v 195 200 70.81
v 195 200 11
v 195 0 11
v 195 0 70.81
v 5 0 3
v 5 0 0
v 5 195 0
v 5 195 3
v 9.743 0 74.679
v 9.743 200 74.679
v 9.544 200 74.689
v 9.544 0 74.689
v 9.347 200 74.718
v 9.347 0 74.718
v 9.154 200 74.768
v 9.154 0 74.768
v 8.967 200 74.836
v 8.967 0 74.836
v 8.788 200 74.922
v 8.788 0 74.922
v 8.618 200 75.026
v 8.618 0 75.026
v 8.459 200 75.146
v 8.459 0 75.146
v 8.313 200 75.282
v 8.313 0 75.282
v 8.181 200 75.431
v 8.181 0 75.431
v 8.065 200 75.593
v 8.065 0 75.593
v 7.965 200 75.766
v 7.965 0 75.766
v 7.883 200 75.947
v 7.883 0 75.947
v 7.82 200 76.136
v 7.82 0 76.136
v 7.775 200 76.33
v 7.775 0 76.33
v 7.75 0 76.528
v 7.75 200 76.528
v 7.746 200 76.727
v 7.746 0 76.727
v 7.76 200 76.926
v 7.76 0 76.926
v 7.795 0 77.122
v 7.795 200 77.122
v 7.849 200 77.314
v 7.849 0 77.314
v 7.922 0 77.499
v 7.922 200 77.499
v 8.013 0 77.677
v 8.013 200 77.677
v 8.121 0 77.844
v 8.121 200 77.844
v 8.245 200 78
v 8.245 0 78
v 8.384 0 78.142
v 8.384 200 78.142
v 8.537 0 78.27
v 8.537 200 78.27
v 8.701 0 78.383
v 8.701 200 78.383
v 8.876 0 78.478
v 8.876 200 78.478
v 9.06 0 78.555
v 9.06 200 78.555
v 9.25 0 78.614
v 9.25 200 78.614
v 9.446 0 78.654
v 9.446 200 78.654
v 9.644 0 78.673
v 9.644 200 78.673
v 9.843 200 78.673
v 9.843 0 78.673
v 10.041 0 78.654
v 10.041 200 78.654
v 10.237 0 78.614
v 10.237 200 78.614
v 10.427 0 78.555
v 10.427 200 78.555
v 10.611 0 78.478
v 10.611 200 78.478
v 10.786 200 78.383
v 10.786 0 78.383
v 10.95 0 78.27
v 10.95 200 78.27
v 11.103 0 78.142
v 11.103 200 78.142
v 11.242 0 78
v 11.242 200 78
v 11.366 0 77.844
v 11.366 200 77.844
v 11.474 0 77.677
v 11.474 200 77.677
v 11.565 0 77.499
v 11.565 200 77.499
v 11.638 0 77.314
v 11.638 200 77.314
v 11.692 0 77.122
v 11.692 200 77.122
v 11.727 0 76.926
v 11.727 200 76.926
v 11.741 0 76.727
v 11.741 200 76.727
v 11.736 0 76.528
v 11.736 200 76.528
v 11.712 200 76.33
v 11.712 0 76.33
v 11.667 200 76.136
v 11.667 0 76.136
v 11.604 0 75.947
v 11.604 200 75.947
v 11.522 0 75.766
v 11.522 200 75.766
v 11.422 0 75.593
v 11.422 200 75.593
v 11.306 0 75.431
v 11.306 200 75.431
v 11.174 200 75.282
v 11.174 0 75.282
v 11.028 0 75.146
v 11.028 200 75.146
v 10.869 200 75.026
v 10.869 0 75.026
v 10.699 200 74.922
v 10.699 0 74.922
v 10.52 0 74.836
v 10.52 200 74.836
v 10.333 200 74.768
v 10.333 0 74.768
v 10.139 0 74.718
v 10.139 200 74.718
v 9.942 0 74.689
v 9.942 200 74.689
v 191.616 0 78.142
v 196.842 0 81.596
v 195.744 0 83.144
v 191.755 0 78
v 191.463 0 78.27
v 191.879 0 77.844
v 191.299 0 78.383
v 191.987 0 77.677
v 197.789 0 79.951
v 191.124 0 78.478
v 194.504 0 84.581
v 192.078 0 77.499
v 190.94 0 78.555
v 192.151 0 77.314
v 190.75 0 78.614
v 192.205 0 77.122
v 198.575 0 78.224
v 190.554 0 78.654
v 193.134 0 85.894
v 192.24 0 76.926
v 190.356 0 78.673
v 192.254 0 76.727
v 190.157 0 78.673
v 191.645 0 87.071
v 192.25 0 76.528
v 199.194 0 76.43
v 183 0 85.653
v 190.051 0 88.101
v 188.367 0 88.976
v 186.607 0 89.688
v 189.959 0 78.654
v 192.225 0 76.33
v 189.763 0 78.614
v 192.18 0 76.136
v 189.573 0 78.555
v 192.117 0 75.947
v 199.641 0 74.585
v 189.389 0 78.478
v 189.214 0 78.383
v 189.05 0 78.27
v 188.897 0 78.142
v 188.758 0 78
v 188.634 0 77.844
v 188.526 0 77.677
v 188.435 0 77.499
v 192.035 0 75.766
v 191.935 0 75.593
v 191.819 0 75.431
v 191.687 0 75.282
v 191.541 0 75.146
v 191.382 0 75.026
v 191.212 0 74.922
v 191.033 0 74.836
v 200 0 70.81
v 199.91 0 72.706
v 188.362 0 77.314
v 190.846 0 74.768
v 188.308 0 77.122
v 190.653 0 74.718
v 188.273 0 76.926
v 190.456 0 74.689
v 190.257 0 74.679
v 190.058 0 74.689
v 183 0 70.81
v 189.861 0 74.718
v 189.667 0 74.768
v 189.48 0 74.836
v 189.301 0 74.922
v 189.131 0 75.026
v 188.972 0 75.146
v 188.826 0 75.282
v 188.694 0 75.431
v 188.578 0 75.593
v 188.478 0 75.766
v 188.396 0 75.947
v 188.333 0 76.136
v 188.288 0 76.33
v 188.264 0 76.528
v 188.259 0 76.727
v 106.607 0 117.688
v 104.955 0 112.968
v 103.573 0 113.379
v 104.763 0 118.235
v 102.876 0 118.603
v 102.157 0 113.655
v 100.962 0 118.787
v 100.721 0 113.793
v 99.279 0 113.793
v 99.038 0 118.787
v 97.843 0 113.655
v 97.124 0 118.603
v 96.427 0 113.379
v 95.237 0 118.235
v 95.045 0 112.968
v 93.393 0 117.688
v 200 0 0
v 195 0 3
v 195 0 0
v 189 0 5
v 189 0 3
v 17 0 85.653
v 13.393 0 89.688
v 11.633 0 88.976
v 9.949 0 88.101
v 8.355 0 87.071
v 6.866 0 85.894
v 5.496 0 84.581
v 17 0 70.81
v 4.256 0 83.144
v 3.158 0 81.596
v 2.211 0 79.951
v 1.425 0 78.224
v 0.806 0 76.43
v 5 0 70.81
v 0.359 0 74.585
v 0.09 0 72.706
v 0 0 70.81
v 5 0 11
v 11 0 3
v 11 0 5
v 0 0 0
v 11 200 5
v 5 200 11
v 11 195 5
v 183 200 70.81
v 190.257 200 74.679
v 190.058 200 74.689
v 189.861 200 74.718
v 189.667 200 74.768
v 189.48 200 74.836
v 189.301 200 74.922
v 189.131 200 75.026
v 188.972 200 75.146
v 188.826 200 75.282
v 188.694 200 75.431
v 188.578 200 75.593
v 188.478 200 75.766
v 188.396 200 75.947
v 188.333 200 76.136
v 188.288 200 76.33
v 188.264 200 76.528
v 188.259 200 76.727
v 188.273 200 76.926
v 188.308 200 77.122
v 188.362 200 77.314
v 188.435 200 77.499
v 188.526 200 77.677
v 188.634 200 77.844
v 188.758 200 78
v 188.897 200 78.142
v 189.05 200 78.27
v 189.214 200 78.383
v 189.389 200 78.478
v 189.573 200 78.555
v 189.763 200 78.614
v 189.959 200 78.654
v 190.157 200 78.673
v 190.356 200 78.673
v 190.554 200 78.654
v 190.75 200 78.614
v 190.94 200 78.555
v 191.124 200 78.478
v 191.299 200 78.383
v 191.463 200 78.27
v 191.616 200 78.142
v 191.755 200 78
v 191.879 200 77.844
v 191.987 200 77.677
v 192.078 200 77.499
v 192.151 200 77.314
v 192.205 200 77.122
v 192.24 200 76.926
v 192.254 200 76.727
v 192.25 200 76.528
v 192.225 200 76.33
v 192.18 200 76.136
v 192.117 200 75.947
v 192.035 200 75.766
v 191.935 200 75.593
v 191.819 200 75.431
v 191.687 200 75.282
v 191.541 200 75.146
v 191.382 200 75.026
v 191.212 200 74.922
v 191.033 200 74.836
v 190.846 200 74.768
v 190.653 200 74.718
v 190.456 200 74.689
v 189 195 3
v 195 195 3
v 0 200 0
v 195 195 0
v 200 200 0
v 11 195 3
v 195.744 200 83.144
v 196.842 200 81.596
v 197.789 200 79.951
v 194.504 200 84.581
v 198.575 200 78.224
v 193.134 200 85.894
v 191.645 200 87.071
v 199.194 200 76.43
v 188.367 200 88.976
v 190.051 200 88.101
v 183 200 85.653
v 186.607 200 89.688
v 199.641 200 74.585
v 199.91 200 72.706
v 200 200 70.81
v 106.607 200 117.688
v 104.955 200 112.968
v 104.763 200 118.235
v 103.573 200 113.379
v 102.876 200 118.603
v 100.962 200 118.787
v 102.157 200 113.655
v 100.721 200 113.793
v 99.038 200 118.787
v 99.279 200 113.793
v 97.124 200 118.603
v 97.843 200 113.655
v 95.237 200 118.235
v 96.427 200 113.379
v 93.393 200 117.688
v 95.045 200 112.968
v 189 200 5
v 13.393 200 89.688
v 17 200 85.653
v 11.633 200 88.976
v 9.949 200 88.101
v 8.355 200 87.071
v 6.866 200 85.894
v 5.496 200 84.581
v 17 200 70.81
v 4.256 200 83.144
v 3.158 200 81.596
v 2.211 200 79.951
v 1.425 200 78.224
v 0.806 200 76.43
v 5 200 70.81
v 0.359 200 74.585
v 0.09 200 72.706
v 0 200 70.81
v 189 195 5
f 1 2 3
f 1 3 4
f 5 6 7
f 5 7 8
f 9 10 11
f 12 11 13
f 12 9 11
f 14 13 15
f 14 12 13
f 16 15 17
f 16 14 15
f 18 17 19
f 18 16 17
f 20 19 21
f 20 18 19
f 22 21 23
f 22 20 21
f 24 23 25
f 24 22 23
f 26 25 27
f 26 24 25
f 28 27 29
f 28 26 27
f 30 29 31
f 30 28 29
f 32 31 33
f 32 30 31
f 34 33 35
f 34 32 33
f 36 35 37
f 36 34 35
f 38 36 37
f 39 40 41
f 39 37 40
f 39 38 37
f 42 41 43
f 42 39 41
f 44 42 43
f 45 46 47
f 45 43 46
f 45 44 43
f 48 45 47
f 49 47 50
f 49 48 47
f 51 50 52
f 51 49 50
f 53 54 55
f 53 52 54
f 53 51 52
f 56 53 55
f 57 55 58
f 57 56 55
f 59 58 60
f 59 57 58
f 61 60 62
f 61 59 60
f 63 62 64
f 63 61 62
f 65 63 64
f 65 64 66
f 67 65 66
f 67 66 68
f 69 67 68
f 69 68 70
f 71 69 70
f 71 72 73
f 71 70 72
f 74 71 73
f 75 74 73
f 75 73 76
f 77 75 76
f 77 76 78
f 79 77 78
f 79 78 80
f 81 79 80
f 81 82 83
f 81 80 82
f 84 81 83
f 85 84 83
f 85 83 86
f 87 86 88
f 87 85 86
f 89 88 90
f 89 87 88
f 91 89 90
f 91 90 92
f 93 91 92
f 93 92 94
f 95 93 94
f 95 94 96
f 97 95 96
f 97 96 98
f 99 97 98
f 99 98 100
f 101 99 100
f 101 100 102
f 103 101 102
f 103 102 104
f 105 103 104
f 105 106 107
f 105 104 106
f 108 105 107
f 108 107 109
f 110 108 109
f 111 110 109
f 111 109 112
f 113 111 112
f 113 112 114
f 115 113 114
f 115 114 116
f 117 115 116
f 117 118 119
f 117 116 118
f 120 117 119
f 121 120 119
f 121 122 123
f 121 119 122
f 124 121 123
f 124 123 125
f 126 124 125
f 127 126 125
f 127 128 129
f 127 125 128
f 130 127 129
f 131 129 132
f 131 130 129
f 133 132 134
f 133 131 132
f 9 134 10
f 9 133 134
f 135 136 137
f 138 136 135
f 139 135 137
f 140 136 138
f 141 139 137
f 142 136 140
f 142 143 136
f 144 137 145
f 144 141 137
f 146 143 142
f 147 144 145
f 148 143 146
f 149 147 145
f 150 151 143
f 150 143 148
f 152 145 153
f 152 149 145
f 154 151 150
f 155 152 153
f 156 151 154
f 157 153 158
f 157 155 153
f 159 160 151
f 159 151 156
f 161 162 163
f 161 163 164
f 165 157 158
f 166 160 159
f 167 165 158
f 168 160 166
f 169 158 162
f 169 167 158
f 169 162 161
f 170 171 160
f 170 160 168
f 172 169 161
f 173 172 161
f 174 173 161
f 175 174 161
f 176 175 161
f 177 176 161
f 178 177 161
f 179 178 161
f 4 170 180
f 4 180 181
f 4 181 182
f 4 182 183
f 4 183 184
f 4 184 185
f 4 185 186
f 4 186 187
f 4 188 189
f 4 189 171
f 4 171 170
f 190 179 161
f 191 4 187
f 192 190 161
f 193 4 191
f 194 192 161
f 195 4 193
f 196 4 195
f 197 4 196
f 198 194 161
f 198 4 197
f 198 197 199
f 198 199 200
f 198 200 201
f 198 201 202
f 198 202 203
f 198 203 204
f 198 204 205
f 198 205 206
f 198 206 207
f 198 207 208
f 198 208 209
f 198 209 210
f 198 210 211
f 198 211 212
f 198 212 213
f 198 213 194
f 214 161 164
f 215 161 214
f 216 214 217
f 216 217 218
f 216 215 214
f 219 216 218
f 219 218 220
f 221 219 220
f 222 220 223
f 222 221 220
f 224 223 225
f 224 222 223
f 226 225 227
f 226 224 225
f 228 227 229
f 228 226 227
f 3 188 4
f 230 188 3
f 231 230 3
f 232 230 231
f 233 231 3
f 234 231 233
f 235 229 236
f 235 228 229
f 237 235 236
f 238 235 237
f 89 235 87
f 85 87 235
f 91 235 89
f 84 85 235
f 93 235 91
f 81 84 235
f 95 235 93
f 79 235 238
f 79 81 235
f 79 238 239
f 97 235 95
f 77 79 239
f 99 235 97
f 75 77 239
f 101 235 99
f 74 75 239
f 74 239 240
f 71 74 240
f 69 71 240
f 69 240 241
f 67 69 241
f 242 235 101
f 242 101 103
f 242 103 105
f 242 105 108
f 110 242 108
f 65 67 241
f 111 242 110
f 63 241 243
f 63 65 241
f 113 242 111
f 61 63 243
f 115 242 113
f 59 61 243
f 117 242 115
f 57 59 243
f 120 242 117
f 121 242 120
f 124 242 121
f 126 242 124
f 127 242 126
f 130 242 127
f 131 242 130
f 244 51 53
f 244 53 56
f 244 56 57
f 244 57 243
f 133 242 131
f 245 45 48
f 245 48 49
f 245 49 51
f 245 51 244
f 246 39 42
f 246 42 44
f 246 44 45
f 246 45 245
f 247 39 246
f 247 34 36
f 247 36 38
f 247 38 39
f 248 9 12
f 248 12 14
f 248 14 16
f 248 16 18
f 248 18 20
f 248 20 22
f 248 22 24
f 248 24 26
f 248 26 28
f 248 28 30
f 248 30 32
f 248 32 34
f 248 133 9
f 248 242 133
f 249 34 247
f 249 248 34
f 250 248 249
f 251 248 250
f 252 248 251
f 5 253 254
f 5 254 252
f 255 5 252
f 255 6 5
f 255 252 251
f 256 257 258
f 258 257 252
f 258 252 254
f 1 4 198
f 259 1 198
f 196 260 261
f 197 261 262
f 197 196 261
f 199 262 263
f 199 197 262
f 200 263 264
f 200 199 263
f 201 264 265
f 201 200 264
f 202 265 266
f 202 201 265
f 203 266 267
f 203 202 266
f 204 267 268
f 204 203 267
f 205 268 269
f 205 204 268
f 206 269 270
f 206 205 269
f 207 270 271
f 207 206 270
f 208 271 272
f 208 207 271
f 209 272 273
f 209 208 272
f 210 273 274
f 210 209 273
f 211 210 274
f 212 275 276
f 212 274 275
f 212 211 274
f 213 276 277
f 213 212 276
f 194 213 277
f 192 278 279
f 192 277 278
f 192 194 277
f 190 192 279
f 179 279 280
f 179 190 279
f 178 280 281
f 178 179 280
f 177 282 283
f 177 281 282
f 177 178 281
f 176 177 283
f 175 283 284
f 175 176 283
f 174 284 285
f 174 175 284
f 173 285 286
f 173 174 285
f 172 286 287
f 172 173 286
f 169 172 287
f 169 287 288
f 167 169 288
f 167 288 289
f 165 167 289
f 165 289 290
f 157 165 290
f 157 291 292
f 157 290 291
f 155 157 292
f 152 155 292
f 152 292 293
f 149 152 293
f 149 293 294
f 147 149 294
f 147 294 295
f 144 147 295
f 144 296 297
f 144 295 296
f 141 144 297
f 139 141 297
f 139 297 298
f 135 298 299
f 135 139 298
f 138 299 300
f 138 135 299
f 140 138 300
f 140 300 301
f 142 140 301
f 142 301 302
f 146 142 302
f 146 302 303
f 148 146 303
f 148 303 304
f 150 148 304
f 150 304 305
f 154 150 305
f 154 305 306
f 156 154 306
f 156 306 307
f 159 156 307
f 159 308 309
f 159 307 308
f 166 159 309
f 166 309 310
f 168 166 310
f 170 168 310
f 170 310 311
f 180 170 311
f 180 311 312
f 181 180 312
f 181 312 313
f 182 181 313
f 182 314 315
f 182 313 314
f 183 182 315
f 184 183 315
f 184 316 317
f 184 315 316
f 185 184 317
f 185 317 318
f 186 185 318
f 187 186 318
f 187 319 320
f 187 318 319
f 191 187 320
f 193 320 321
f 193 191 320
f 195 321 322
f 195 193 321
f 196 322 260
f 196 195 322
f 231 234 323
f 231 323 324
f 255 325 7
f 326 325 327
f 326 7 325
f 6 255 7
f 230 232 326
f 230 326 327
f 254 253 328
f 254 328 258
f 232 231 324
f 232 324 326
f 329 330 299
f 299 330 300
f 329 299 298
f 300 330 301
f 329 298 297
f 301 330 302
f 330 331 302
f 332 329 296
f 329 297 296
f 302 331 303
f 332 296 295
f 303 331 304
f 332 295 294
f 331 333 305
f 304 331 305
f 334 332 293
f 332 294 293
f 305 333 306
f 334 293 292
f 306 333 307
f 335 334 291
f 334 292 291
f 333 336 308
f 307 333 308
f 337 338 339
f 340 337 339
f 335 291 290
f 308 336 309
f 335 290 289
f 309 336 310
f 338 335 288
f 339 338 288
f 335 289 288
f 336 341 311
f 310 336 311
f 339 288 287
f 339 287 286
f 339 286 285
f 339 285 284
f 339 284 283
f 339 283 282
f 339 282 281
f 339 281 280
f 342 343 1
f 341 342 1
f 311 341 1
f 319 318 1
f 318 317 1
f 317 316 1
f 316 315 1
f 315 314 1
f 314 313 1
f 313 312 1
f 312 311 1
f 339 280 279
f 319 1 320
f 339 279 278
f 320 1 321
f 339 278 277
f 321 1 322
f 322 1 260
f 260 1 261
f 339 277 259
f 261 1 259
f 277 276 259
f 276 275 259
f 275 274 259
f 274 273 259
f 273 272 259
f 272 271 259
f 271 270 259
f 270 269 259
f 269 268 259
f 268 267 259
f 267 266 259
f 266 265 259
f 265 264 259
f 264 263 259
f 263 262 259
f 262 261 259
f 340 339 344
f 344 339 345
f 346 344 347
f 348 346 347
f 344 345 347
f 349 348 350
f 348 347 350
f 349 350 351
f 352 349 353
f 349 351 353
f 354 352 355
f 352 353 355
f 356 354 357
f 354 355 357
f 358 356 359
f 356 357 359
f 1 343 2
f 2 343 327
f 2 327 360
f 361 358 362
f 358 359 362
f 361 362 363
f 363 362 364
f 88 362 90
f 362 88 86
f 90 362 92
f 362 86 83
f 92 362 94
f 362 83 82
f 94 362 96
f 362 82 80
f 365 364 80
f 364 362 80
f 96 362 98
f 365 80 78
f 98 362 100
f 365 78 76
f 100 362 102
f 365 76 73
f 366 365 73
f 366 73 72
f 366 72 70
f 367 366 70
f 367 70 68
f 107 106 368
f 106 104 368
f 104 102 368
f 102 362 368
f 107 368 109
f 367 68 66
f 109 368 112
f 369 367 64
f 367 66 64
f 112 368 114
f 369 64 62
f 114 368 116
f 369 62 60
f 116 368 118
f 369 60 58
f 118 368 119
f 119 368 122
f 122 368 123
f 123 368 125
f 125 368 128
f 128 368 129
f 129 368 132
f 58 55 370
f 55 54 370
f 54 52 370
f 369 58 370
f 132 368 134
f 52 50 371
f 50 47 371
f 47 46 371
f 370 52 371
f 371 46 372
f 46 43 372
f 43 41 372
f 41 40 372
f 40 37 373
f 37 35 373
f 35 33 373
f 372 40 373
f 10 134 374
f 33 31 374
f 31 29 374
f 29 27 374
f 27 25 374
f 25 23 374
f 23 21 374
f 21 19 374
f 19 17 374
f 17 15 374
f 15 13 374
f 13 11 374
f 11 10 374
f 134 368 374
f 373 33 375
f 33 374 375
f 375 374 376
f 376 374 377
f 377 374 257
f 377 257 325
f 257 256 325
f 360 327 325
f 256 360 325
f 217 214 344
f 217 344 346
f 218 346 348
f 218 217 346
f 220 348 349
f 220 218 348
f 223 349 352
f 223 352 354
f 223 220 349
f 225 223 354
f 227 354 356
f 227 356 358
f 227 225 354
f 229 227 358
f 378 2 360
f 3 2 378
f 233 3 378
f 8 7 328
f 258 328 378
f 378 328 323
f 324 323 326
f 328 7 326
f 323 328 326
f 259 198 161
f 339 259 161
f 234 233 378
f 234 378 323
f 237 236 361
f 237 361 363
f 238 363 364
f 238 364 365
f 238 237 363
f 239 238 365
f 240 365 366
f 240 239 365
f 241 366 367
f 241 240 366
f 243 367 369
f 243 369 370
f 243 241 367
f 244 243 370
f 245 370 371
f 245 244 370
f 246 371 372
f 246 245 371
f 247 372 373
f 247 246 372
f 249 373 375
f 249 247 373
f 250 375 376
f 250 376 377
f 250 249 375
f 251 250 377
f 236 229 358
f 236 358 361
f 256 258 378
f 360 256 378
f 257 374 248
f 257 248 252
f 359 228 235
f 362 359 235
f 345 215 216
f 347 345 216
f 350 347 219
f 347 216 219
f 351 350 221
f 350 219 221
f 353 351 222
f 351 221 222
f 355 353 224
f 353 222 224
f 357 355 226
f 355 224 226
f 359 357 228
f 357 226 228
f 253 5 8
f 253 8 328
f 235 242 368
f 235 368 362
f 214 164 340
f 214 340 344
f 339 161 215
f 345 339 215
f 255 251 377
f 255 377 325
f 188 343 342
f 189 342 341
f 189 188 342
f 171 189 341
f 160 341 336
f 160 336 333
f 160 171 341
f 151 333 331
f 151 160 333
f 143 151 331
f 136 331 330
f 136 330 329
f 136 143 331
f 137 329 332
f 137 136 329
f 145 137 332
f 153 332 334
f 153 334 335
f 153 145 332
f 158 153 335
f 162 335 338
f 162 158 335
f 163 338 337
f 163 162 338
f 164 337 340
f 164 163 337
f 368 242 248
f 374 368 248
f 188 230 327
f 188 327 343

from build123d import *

# Parameters (mm, degrees)
BOSS_EXTRUDE1_DEPTH = 200
SHELL3_T            = -5
CUT_EXTRUDE1_DEPTH  = 195
BOSS_EXTRUDE2_DEPTH = 200
BOSS_EXTRUDE3_DEPTH = 200
SKETCH5_R           = 1.998576913
CUT_EXTRUDE2_DEPTH  = 210


with BuildPart() as part:
    # Sketch1 → Boss-Extrude1 (new body)
    with BuildSketch(Plane(origin=(0, 0, 0), x_dir=(1, 0, 0), z_dir=(0, 1, 0))):
        with BuildLine():
            Line((0, 0), (200, 0))
            Line((200, 0), (200, -70.8103799))
            ThreePointArc((200, -70.8103799), (196.311654881, -82.383189198), (186.607008495, -89.687547027))
            Line((186.607008495, -89.687547027), (106.607008495, -117.687547027))
            ThreePointArc((106.607008495, -117.687547027), (100, -118.8103799), (93.392991505, -117.687547027))
            Line((93.392991505, -117.687547027), (13.392991505, -89.687547027))
            ThreePointArc((13.392991505, -89.687547027), (3.688345119, -82.383189198), (0, -70.8103799))
            Line((0, -70.8103799), (0, 0))
        make_face()
    extrude(amount=BOSS_EXTRUDE1_DEPTH)

    # Shell3
    shell3_openings = [part.faces().sort_by_distance(p)[0] for p in [
        (100, 200, 51.617363214),
        (100, 0, 51.617363214),
    ]]
    offset(amount=SHELL3_T, openings=shell3_openings, kind=Kind.INTERSECTION)

    # Sketch2 → Cut-Extrude1 (cut)
    with BuildSketch(Plane(origin=(0, 0, 0), x_dir=(1, 0, 0), z_dir=(0, 1, 0))):
        Polygon((195, 0), (187.458653408, 0), (12.307944586, 0), (5, 0), (5, -3), (11, -3), (11, -5), (189, -5), (189, -3), (195, -3), align=None)
    extrude(amount=CUT_EXTRUDE1_DEPTH, mode=Mode.SUBTRACT)

    # Sketch3 → Boss-Extrude2 (add)
    with BuildSketch(Plane(origin=(0, 0, 0), x_dir=(1, 0, 0), z_dir=(0, 1, 0))):
        Polygon((5, -5), (5, -11), (11, -5), align=None)
        Polygon((195, -5), (195, -11), (189, -5), align=None)
    extrude(amount=BOSS_EXTRUDE2_DEPTH)

    # Sketch4 → Boss-Extrude3 (add)
    with BuildSketch(Plane(origin=(0, 0, 0), x_dir=(1, 0, 0), z_dir=(0, 1, 0))):
        Polygon((5, -70.8103799), (17, -70.8103799), (17, -85.652594975), (13.392991505, -89.687547027), (0, -70.8103799), align=None)
        Polygon((195, -70.8103799), (183, -70.8103799), (183, -85.652594975), (186.607008495, -89.687547027), (200, -70.8103799), align=None)
    extrude(amount=BOSS_EXTRUDE3_DEPTH)

    # Sketch5 → Cut-Extrude2 (cut)
    with BuildSketch(Plane(origin=(0, 0, 0), x_dir=(1, 0, 0), z_dir=(0, 1, 0))):
        with Locations(Location((9.743456049, -76.677329473, 0), (0, 0, 90))):
            Circle(SKETCH5_R)
        with Locations(Location((190.256543951, -76.677329473, 0), (0, 0, 90))):
            Circle(SKETCH5_R)
    extrude(amount=CUT_EXTRUDE2_DEPTH, mode=Mode.SUBTRACT)


solid = part.part
